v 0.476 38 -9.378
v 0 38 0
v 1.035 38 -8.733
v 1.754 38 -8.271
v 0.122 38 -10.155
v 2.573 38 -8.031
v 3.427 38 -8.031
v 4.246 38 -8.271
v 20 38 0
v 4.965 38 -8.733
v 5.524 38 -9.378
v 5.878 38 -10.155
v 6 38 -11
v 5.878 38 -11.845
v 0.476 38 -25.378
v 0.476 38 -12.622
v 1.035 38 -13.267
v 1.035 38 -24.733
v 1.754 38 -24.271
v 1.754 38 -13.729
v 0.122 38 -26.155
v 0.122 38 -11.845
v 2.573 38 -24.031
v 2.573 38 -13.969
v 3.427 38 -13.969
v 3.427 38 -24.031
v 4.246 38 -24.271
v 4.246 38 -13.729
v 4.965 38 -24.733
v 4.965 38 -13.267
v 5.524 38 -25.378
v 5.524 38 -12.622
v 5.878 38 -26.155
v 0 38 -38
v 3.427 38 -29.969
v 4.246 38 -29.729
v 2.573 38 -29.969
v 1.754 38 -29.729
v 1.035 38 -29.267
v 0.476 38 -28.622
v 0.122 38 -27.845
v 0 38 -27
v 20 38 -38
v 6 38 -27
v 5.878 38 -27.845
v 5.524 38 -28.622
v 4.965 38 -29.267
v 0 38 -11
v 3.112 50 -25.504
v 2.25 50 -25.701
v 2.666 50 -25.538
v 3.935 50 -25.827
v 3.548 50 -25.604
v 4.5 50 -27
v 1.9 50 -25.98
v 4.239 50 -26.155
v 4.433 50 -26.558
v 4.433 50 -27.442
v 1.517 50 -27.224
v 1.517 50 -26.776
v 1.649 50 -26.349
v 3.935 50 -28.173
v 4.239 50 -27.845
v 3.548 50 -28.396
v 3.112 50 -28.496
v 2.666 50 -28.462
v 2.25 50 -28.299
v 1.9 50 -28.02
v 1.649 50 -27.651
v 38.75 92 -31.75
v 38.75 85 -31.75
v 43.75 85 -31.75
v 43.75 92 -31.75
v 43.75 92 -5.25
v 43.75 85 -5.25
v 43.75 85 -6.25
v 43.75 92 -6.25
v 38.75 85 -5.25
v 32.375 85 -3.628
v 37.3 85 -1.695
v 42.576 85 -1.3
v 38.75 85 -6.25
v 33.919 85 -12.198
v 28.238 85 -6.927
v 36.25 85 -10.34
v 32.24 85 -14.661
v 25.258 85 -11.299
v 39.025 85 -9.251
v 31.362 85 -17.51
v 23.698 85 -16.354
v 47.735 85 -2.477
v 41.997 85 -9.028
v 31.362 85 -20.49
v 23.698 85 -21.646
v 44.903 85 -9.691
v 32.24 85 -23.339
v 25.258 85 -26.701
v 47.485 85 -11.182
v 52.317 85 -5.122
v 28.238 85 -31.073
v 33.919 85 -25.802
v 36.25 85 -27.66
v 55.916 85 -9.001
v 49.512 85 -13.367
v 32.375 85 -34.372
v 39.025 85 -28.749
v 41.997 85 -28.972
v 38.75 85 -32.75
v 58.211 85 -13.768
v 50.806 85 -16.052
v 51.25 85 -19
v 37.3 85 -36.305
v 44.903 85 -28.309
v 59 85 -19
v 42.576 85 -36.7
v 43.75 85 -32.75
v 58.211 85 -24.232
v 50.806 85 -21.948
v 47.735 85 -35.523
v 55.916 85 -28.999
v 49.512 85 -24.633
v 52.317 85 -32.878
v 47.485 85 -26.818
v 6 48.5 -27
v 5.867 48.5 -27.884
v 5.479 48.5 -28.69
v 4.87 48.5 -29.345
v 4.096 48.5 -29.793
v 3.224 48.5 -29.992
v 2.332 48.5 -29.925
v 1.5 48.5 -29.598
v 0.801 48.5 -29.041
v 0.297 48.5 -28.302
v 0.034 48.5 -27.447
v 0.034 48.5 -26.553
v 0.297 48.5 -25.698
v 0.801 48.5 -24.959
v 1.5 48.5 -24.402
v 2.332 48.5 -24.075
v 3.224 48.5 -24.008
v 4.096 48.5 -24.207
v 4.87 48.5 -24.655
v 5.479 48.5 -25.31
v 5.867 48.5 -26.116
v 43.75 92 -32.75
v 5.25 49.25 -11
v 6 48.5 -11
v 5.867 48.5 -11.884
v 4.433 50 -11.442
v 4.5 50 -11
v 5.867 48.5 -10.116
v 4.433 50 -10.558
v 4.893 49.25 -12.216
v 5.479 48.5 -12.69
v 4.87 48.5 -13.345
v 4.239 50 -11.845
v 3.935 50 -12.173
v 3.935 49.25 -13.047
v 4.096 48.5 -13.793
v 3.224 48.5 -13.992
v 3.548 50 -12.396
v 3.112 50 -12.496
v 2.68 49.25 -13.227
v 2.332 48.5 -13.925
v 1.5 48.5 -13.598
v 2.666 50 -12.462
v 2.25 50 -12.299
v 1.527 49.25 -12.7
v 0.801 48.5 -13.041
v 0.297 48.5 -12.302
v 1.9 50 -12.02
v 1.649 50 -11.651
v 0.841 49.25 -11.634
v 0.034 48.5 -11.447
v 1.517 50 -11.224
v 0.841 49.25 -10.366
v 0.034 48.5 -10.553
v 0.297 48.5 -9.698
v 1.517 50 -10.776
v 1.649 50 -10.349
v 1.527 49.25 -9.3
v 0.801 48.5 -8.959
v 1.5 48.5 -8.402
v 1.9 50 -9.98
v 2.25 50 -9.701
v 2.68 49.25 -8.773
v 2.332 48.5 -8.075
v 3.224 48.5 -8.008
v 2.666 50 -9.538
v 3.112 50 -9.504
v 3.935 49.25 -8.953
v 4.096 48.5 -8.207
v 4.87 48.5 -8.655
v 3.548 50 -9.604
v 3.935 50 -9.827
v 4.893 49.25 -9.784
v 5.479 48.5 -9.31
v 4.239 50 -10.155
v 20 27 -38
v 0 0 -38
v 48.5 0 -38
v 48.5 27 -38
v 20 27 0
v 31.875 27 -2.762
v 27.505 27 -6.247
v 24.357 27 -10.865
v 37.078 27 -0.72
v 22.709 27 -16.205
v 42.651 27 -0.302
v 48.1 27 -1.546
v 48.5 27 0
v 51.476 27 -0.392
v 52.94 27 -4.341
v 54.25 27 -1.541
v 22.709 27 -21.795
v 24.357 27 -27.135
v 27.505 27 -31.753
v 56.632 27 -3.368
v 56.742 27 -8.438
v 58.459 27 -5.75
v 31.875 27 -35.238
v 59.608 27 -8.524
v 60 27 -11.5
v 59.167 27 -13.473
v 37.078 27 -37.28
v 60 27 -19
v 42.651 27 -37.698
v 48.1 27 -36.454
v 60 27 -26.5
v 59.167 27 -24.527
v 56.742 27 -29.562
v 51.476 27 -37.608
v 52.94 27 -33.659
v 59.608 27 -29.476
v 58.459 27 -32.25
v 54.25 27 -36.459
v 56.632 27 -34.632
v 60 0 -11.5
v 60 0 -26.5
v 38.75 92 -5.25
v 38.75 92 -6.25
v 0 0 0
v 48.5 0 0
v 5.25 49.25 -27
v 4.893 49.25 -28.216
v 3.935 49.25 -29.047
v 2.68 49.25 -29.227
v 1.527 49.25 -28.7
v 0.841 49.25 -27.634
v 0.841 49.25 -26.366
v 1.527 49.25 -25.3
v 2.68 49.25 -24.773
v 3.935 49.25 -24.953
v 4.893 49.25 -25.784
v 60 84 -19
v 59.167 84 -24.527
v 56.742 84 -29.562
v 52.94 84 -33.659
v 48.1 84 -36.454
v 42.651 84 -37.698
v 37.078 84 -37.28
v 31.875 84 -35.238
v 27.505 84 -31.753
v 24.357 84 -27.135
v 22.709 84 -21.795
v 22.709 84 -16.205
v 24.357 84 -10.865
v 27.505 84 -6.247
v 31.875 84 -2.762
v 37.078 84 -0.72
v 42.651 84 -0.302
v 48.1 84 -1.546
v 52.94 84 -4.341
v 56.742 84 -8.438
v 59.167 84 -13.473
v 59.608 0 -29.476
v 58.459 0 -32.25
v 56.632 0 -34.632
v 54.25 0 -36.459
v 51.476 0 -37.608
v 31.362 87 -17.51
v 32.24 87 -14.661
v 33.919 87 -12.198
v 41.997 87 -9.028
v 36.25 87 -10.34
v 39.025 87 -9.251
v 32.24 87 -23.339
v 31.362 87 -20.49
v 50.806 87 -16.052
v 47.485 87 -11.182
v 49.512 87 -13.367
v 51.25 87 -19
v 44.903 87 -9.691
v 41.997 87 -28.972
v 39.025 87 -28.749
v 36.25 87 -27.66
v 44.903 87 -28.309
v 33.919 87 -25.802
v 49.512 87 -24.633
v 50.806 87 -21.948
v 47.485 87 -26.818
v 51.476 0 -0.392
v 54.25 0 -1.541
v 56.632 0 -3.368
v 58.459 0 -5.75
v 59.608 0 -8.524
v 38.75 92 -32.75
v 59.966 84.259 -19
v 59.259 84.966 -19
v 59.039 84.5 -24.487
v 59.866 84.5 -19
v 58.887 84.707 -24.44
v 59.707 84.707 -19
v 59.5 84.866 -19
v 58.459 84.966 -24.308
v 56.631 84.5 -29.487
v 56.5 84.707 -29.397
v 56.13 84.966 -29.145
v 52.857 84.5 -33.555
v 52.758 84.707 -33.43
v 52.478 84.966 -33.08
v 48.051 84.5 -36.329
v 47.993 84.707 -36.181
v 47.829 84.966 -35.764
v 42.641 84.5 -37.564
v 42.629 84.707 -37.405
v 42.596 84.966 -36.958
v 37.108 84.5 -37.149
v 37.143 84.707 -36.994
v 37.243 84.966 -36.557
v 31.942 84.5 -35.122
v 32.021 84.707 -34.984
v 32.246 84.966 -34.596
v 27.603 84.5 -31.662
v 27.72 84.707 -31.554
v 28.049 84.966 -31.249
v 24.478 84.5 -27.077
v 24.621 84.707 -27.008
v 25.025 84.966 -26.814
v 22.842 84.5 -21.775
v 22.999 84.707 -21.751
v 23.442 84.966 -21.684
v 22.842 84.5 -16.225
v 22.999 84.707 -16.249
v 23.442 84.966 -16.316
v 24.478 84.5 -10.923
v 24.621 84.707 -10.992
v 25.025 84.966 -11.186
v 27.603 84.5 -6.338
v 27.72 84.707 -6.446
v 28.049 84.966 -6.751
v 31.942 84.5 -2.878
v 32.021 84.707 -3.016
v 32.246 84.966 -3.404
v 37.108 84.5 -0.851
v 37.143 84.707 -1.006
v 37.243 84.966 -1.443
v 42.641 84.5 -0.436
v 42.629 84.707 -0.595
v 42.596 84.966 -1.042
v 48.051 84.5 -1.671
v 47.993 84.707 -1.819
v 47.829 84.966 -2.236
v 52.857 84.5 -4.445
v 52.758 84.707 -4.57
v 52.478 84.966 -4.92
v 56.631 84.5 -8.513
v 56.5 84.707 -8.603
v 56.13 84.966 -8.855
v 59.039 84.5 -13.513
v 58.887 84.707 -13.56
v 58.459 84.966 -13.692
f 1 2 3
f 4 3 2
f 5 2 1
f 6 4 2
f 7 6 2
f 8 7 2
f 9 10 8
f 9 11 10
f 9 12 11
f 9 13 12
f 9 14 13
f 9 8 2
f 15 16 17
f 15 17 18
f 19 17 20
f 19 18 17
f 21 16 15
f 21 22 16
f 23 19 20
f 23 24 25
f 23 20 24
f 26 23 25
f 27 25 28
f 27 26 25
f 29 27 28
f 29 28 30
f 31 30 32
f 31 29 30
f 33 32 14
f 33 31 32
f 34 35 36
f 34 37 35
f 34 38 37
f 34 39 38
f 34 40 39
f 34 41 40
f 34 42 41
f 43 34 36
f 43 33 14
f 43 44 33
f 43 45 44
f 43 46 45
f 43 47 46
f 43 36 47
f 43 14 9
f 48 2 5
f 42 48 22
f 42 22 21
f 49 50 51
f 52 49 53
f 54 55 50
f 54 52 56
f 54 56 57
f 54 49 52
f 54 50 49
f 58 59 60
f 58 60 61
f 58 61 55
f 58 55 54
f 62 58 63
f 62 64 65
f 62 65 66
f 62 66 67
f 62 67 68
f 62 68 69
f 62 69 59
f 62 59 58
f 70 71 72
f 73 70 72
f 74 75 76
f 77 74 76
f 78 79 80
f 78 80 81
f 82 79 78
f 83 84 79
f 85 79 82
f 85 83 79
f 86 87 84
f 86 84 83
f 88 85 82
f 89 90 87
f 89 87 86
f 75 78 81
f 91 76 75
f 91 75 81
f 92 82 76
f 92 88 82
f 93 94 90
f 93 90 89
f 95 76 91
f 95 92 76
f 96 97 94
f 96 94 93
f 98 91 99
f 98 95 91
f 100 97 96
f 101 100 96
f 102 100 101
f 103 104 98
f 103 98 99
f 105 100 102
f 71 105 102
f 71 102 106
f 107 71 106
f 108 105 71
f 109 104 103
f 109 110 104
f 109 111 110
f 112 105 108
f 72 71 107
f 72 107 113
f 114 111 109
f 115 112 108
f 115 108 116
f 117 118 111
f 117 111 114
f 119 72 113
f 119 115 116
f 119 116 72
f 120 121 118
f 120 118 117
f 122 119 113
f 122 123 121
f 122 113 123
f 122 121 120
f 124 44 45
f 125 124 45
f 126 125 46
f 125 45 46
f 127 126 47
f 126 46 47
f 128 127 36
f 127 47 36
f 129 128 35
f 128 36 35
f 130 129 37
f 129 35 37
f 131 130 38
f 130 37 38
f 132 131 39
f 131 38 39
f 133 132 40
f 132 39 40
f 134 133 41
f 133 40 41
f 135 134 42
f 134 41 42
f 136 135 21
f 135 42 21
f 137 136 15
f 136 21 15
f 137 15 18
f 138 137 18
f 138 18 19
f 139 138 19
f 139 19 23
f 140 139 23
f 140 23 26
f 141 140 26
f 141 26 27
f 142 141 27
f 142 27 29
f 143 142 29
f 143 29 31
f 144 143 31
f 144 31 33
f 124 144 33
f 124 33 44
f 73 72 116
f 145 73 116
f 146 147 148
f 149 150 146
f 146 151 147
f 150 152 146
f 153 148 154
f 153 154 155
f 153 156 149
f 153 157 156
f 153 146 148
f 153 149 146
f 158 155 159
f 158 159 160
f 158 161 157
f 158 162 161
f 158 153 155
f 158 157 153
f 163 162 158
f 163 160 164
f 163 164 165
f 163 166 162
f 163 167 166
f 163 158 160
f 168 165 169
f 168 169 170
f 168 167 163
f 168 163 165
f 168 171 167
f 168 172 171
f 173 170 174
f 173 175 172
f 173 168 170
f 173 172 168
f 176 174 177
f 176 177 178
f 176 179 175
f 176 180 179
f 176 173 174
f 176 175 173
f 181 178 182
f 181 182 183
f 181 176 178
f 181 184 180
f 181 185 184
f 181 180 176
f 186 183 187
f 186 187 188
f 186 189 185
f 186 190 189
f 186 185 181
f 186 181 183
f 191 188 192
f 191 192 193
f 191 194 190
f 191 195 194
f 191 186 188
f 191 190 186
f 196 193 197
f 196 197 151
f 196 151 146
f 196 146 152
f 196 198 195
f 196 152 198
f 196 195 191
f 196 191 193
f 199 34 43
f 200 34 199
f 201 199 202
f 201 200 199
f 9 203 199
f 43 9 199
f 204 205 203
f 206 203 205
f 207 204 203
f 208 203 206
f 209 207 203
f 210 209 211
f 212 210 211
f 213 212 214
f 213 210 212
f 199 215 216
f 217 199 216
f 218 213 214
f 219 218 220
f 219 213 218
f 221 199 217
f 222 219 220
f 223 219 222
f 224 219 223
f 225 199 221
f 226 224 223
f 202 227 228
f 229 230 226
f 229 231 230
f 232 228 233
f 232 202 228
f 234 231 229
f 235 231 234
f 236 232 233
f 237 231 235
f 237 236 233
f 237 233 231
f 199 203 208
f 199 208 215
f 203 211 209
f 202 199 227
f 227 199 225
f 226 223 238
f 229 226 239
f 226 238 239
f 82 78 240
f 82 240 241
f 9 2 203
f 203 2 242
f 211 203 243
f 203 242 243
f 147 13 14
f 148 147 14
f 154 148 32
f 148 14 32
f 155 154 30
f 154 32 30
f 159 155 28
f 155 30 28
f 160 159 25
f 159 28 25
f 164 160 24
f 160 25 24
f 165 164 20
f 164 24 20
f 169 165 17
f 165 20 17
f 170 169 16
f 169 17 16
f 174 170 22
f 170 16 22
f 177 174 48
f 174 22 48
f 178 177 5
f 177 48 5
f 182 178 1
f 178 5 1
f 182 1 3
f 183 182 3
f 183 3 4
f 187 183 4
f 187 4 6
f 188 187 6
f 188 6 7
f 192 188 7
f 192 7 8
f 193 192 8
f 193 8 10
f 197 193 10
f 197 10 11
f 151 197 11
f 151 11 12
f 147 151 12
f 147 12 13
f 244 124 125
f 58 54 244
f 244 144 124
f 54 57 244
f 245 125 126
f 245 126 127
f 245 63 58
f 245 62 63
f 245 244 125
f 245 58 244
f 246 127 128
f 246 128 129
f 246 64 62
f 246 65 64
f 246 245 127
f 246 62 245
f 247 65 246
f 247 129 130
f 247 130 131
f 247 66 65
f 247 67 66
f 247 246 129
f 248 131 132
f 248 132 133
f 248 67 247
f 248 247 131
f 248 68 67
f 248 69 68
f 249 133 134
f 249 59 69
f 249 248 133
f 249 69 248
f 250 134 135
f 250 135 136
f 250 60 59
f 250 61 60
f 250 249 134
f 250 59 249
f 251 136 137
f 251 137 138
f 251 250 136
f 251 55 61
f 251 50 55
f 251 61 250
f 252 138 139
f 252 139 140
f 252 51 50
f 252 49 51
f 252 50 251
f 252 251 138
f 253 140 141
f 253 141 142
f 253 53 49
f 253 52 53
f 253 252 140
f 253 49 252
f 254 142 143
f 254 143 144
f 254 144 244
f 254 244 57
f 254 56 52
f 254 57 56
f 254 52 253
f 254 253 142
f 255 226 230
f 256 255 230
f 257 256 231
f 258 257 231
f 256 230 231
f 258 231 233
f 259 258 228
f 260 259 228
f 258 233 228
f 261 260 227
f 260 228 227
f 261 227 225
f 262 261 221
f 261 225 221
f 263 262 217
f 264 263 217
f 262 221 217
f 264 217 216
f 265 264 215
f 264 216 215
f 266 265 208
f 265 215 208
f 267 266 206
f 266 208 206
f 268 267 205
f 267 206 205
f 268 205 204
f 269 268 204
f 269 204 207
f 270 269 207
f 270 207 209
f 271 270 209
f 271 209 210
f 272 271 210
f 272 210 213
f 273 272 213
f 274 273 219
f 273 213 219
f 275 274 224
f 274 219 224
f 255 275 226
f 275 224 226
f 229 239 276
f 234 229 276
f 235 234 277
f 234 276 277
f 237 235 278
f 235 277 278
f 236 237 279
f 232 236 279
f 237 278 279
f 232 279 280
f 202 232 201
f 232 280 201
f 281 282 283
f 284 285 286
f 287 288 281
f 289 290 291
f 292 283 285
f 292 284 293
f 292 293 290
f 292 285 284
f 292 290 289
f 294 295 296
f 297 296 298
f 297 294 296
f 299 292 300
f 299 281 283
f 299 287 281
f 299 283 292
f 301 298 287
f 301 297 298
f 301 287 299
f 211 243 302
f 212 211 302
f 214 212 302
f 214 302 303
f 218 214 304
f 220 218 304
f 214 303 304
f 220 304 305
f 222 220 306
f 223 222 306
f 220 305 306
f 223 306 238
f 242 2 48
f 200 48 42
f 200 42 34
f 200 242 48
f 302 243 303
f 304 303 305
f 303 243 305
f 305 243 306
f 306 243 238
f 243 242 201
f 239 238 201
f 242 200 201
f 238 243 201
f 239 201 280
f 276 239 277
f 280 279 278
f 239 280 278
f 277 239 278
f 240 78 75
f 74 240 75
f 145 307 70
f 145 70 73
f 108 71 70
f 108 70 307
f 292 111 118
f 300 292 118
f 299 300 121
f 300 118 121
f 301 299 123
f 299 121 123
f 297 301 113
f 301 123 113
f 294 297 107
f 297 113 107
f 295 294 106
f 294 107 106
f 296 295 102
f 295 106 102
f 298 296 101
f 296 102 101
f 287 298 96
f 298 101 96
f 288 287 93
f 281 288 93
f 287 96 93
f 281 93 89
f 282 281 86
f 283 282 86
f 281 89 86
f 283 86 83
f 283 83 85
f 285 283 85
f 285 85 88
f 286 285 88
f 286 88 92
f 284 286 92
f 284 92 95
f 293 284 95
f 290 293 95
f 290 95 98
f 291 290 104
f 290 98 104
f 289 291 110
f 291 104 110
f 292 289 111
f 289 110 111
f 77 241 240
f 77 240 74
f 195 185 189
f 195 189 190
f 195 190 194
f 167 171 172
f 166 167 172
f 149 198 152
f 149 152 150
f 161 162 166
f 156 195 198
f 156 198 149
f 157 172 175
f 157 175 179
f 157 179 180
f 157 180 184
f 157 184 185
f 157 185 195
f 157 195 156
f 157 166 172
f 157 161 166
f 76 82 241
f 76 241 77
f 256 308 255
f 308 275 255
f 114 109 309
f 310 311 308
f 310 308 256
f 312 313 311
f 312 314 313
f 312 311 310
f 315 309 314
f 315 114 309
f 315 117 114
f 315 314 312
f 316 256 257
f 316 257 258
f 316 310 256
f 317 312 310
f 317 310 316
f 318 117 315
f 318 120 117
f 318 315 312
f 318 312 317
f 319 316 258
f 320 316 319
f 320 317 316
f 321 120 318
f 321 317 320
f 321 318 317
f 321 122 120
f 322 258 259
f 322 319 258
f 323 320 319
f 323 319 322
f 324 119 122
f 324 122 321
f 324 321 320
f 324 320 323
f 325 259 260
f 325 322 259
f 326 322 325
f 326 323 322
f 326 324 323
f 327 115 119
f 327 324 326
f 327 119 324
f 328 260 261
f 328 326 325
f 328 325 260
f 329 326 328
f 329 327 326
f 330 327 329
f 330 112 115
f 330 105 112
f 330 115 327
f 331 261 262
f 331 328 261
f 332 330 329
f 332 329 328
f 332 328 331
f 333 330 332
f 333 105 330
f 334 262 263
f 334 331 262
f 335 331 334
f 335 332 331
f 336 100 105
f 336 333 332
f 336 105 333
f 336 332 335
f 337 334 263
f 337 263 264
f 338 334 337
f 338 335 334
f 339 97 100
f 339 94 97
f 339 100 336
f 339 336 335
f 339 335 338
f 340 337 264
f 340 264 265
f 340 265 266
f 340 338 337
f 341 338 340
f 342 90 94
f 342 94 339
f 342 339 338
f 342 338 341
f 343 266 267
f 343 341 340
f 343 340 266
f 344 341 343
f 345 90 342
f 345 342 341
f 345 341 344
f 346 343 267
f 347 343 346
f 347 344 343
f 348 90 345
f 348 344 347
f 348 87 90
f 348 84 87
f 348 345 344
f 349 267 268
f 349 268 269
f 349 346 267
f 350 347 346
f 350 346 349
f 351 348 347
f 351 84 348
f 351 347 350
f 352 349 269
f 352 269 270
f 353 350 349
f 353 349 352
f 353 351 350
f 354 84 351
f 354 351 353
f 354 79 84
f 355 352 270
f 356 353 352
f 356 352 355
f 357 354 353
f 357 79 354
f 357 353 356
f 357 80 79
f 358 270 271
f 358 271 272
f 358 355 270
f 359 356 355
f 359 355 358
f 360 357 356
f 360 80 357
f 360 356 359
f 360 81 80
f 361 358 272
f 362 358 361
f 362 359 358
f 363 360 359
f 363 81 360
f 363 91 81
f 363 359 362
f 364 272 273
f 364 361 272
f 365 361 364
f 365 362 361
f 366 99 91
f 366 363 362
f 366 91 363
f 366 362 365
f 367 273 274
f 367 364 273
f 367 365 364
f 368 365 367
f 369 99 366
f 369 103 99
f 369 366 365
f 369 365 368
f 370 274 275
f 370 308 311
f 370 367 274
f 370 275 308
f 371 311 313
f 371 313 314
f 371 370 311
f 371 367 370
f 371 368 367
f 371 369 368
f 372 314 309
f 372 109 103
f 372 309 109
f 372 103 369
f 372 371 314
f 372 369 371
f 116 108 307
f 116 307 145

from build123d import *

# Parameters (mm, degrees)
EXTRUSION1_DEPTH = 27
ESQUISSE2_W      = 20
ESQUISSE2_H      = 38
EXTRUSION2_DEPTH = 11
ESQUISSE3_R      = 18.75
EXTRUSION3_DEPTH = 58
ESQUISSE4_R      = 10
EXTRUSION4_DEPTH = 2
ESQUISSE5_R      = 3
EXTRUSION5_DEPTH = 12
CHANFREIN1_SIZE  = 1.5
CONG_1_R         = 1
ESQUISSE6_W      = 5
ESQUISSE6_H      = 1
EXTRUSION6_DEPTH = 7


with BuildPart() as part:
    # Esquisse1 → Extrusion1 (new body)
    with BuildSketch(Plane(origin=(0, 0, 0), x_dir=(1, 0, 0), z_dir=(0, 1, 0))):
        with BuildLine():
            Line((0, 0), (48.5, 0))
            ThreePointArc((48.5, 0), (56.631727984, 3.368272016), (60, 11.5))
            Line((60, 11.5), (60, 26.5))
            ThreePointArc((60, 26.5), (56.631727984, 34.631727984), (48.5, 38))
            Line((48.5, 38), (0, 38))
            Line((0, 38), (0, 0))
        make_face()
    extrude(amount=EXTRUSION1_DEPTH)

    # Esquisse2 → Extrusion2 (add)
    with BuildSketch(Plane(origin=(0, 27, 0), x_dir=(1, 0, 0), z_dir=(0, 1, 0))):
        with Locations((10, 19)):
            Rectangle(ESQUISSE2_W, ESQUISSE2_H)
    extrude(amount=EXTRUSION2_DEPTH)

    # Esquisse3 → Extrusion3 (add)
    with BuildSketch(Plane(origin=(0, 27, 0), x_dir=(1, 0, 0), z_dir=(0, 1, 0))):
        with Locations((41.25, 19)):
            Circle(ESQUISSE3_R)
    extrude(amount=EXTRUSION3_DEPTH)

    # Esquisse4 → Extrusion4 (add)
    with BuildSketch(Plane(origin=(0, 85, 0), x_dir=(1, 0, 0), z_dir=(0, 1, 0))):
        with Locations((41.25, 19)):
            Circle(ESQUISSE4_R)
    extrude(amount=EXTRUSION4_DEPTH)

    # Esquisse5 → Extrusion5 (add)
    with BuildSketch(Plane(origin=(0, 38, 0), x_dir=(1, 0, 0), z_dir=(0, 1, 0))):
        with Locations((3, 27)):
            Circle(ESQUISSE5_R)
        with Locations((3, 11)):
            Circle(ESQUISSE5_R)
    extrude(amount=EXTRUSION5_DEPTH)

    # Chanfrein1
    chanfrein1_edges = [part.edges().sort_by_distance(p)[0] for p in [
        (0, 50, -27),
        (0, 50, -11),
    ]]
    chamfer(chanfrein1_edges, length=CHANFREIN1_SIZE)

    # Congé1
    cong_1_edges = [part.edges().sort_by_distance(p)[0] for p in [
        (22.5, 85, -19),
    ]]
    fillet(cong_1_edges, radius=CONG_1_R)

    # Esquisse6 → Extrusion6 (add)
    with BuildSketch(Plane(origin=(0, 85, 0), x_dir=(1, 0, 0), z_dir=(0, 1, 0))):
        with Locations((41.25, 32.25)):
            Rectangle(ESQUISSE6_W, ESQUISSE6_H)
        with Locations((41.25, 5.75)):
            Rectangle(ESQUISSE6_W, ESQUISSE6_H)
    extrude(amount=EXTRUSION6_DEPTH)


solid = part.part
